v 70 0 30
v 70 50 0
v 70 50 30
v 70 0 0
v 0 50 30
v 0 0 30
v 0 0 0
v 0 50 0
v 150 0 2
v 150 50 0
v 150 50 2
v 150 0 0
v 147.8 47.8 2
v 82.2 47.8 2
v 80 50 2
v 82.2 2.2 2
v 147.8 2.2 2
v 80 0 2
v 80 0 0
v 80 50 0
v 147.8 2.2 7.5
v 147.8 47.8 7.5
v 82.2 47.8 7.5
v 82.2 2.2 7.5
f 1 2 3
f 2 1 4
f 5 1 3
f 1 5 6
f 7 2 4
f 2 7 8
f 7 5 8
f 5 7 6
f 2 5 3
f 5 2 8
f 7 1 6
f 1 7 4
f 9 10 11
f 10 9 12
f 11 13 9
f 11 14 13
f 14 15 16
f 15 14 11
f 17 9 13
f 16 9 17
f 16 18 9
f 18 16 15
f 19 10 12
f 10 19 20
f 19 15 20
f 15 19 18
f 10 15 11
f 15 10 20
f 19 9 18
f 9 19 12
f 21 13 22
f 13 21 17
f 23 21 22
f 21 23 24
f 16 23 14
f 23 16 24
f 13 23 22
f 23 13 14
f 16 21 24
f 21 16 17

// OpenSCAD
// Two-part enclosure for electronics board (Box + Lid)
// Part 1: Box (70x50x30, 2mm walls, 2mm floor, open top)
// Part 2: Lid (70x50 plate with 65.6x45.6 lip, 0.2mm clearance)
// Orientation: Both rest on XY plane (Z=0). Lid is on +X side.

// Dimensions
BOX_X  = 70;
BOX_Y  = 50;
BOX_Z  = 30;
WALL   = 2;
FLOOR  = 2;

LID_PLATE_X = 70;
LID_PLATE_Y = 50;
LID_PLATE_T = 2;

LIP_OUT_X  = 65.6;
LIP_OUT_Y  = 45.6;
LIP_WALL_T = 1.5;
LIP_H      = 4;

// Clearance calculation
// Box inner width = 70 - 2*2 = 66
// Lip outer width = 65.6
// Total clearance = 66 - 65.6 = 0.4 mm
// Clearance per side = 0.2 mm (matches requirement)

// Gap between parts
GAP = 10;

$fn = 64;

// --- Part 1: The Box ---
// Constructed by extruding a 2D profile with a hole for the opening.
// Profile: Outer rect 70x50, Inner rect (opening) 66x48 at bottom.
// Thickness: 2mm.

module box() {
    // Calculate inner opening dimensions
    inner_w = BOX_X - 2 * WALL; // 66
    inner_h = BOX_Y - 2 * WALL; // 46 (Wait, floor is 2mm, walls are 2mm. 
                                // If it's open top, the hole goes all the way through the side walls.
                                // Floor is 2mm thick.
                                // So the hole is defined by the inner walls.
                                // Inner width = 70 - 2*2 = 66.
                                // Inner height (Y) = 50 - 2*2 = 46.
                                // The hole depth is BOX_Z - FLOOR = 28.
    // Let's refine the profile logic:
    // We extrude a shape that is 2mm thick.
    // The shape has an outer boundary and an inner boundary (hole).
    
    // Outer profile points (radius, height) for rotate_extrude? No, use linear_extrude.
    // Let's build the solid directly using difference for clarity.
    
    // Base block
    translate([0, 0, 0]) 
        cube([BOX_X, BOX_Y, BOX_Z]);
    
    // Cut the top opening
    // The opening is a hole through the top, but the floor remains.
    // Hole dimensions: (BOX_X - 2*WALL) x (BOX_Y - 2*WALL)
    // Hole depth: BOX_Z - FLOOR
    translate([WALL, WALL, BOX_Z - FLOOR])
        cube([BOX_X - 2 * WALL, BOX_Y - 2 * WALL, FLOOR]);
}

// --- Part 2: The Lid ---
// A plate 70x50x2 with a lip on top.
// The lip is 1.5mm thick, 4mm tall.
// Lip outer size: 65.6 x 45.6.
// Lip is centred on the plate.

module lid() {
    // Main plate
    translate([0, 0, 0])
        cube([LID_PLATE_X, LID_PLATE_Y, LID_PLATE_T]);
    
    // Lip
    // The lip sits on top of the plate.
    // Lip outer dimensions: 65.6 x 45.6
    // Lip thickness: 1.5
    // Lip height: 4
    // Position: Centred on the plate.
    // Plate is 70x50. Lip is 65.6x45.6.
    // Offset X = (70 - 65.6) / 2 = 2.2
    // Offset Y = (50 - 45.6) / 2 = 2.2
    
    lip_offset_x = (LID_PLATE_X - LIP_OUT_X) / 2;
    lip_offset_y = (LID_PLATE_Y - LIP_OUT_Y) / 2;
    
    translate([lip_offset_x, lip_offset_y, LID_PLATE_T])
        cube([LIP_OUT_X, LIP_OUT_Y, LIP_WALL_T + LIP_H]);
}

// --- Assembly ---
// Place Box at origin.
// Place Lid at +X side with 10mm gap.
// Lid X position = BOX_X + GAP = 70 + 10 = 80.
// Lid Y position = 0 (centred).
// Lid Z position = 0 (resting on bed).

translate([0, 0, 0]) box();
translate([BOX_X + GAP, 0, 0]) lid();
